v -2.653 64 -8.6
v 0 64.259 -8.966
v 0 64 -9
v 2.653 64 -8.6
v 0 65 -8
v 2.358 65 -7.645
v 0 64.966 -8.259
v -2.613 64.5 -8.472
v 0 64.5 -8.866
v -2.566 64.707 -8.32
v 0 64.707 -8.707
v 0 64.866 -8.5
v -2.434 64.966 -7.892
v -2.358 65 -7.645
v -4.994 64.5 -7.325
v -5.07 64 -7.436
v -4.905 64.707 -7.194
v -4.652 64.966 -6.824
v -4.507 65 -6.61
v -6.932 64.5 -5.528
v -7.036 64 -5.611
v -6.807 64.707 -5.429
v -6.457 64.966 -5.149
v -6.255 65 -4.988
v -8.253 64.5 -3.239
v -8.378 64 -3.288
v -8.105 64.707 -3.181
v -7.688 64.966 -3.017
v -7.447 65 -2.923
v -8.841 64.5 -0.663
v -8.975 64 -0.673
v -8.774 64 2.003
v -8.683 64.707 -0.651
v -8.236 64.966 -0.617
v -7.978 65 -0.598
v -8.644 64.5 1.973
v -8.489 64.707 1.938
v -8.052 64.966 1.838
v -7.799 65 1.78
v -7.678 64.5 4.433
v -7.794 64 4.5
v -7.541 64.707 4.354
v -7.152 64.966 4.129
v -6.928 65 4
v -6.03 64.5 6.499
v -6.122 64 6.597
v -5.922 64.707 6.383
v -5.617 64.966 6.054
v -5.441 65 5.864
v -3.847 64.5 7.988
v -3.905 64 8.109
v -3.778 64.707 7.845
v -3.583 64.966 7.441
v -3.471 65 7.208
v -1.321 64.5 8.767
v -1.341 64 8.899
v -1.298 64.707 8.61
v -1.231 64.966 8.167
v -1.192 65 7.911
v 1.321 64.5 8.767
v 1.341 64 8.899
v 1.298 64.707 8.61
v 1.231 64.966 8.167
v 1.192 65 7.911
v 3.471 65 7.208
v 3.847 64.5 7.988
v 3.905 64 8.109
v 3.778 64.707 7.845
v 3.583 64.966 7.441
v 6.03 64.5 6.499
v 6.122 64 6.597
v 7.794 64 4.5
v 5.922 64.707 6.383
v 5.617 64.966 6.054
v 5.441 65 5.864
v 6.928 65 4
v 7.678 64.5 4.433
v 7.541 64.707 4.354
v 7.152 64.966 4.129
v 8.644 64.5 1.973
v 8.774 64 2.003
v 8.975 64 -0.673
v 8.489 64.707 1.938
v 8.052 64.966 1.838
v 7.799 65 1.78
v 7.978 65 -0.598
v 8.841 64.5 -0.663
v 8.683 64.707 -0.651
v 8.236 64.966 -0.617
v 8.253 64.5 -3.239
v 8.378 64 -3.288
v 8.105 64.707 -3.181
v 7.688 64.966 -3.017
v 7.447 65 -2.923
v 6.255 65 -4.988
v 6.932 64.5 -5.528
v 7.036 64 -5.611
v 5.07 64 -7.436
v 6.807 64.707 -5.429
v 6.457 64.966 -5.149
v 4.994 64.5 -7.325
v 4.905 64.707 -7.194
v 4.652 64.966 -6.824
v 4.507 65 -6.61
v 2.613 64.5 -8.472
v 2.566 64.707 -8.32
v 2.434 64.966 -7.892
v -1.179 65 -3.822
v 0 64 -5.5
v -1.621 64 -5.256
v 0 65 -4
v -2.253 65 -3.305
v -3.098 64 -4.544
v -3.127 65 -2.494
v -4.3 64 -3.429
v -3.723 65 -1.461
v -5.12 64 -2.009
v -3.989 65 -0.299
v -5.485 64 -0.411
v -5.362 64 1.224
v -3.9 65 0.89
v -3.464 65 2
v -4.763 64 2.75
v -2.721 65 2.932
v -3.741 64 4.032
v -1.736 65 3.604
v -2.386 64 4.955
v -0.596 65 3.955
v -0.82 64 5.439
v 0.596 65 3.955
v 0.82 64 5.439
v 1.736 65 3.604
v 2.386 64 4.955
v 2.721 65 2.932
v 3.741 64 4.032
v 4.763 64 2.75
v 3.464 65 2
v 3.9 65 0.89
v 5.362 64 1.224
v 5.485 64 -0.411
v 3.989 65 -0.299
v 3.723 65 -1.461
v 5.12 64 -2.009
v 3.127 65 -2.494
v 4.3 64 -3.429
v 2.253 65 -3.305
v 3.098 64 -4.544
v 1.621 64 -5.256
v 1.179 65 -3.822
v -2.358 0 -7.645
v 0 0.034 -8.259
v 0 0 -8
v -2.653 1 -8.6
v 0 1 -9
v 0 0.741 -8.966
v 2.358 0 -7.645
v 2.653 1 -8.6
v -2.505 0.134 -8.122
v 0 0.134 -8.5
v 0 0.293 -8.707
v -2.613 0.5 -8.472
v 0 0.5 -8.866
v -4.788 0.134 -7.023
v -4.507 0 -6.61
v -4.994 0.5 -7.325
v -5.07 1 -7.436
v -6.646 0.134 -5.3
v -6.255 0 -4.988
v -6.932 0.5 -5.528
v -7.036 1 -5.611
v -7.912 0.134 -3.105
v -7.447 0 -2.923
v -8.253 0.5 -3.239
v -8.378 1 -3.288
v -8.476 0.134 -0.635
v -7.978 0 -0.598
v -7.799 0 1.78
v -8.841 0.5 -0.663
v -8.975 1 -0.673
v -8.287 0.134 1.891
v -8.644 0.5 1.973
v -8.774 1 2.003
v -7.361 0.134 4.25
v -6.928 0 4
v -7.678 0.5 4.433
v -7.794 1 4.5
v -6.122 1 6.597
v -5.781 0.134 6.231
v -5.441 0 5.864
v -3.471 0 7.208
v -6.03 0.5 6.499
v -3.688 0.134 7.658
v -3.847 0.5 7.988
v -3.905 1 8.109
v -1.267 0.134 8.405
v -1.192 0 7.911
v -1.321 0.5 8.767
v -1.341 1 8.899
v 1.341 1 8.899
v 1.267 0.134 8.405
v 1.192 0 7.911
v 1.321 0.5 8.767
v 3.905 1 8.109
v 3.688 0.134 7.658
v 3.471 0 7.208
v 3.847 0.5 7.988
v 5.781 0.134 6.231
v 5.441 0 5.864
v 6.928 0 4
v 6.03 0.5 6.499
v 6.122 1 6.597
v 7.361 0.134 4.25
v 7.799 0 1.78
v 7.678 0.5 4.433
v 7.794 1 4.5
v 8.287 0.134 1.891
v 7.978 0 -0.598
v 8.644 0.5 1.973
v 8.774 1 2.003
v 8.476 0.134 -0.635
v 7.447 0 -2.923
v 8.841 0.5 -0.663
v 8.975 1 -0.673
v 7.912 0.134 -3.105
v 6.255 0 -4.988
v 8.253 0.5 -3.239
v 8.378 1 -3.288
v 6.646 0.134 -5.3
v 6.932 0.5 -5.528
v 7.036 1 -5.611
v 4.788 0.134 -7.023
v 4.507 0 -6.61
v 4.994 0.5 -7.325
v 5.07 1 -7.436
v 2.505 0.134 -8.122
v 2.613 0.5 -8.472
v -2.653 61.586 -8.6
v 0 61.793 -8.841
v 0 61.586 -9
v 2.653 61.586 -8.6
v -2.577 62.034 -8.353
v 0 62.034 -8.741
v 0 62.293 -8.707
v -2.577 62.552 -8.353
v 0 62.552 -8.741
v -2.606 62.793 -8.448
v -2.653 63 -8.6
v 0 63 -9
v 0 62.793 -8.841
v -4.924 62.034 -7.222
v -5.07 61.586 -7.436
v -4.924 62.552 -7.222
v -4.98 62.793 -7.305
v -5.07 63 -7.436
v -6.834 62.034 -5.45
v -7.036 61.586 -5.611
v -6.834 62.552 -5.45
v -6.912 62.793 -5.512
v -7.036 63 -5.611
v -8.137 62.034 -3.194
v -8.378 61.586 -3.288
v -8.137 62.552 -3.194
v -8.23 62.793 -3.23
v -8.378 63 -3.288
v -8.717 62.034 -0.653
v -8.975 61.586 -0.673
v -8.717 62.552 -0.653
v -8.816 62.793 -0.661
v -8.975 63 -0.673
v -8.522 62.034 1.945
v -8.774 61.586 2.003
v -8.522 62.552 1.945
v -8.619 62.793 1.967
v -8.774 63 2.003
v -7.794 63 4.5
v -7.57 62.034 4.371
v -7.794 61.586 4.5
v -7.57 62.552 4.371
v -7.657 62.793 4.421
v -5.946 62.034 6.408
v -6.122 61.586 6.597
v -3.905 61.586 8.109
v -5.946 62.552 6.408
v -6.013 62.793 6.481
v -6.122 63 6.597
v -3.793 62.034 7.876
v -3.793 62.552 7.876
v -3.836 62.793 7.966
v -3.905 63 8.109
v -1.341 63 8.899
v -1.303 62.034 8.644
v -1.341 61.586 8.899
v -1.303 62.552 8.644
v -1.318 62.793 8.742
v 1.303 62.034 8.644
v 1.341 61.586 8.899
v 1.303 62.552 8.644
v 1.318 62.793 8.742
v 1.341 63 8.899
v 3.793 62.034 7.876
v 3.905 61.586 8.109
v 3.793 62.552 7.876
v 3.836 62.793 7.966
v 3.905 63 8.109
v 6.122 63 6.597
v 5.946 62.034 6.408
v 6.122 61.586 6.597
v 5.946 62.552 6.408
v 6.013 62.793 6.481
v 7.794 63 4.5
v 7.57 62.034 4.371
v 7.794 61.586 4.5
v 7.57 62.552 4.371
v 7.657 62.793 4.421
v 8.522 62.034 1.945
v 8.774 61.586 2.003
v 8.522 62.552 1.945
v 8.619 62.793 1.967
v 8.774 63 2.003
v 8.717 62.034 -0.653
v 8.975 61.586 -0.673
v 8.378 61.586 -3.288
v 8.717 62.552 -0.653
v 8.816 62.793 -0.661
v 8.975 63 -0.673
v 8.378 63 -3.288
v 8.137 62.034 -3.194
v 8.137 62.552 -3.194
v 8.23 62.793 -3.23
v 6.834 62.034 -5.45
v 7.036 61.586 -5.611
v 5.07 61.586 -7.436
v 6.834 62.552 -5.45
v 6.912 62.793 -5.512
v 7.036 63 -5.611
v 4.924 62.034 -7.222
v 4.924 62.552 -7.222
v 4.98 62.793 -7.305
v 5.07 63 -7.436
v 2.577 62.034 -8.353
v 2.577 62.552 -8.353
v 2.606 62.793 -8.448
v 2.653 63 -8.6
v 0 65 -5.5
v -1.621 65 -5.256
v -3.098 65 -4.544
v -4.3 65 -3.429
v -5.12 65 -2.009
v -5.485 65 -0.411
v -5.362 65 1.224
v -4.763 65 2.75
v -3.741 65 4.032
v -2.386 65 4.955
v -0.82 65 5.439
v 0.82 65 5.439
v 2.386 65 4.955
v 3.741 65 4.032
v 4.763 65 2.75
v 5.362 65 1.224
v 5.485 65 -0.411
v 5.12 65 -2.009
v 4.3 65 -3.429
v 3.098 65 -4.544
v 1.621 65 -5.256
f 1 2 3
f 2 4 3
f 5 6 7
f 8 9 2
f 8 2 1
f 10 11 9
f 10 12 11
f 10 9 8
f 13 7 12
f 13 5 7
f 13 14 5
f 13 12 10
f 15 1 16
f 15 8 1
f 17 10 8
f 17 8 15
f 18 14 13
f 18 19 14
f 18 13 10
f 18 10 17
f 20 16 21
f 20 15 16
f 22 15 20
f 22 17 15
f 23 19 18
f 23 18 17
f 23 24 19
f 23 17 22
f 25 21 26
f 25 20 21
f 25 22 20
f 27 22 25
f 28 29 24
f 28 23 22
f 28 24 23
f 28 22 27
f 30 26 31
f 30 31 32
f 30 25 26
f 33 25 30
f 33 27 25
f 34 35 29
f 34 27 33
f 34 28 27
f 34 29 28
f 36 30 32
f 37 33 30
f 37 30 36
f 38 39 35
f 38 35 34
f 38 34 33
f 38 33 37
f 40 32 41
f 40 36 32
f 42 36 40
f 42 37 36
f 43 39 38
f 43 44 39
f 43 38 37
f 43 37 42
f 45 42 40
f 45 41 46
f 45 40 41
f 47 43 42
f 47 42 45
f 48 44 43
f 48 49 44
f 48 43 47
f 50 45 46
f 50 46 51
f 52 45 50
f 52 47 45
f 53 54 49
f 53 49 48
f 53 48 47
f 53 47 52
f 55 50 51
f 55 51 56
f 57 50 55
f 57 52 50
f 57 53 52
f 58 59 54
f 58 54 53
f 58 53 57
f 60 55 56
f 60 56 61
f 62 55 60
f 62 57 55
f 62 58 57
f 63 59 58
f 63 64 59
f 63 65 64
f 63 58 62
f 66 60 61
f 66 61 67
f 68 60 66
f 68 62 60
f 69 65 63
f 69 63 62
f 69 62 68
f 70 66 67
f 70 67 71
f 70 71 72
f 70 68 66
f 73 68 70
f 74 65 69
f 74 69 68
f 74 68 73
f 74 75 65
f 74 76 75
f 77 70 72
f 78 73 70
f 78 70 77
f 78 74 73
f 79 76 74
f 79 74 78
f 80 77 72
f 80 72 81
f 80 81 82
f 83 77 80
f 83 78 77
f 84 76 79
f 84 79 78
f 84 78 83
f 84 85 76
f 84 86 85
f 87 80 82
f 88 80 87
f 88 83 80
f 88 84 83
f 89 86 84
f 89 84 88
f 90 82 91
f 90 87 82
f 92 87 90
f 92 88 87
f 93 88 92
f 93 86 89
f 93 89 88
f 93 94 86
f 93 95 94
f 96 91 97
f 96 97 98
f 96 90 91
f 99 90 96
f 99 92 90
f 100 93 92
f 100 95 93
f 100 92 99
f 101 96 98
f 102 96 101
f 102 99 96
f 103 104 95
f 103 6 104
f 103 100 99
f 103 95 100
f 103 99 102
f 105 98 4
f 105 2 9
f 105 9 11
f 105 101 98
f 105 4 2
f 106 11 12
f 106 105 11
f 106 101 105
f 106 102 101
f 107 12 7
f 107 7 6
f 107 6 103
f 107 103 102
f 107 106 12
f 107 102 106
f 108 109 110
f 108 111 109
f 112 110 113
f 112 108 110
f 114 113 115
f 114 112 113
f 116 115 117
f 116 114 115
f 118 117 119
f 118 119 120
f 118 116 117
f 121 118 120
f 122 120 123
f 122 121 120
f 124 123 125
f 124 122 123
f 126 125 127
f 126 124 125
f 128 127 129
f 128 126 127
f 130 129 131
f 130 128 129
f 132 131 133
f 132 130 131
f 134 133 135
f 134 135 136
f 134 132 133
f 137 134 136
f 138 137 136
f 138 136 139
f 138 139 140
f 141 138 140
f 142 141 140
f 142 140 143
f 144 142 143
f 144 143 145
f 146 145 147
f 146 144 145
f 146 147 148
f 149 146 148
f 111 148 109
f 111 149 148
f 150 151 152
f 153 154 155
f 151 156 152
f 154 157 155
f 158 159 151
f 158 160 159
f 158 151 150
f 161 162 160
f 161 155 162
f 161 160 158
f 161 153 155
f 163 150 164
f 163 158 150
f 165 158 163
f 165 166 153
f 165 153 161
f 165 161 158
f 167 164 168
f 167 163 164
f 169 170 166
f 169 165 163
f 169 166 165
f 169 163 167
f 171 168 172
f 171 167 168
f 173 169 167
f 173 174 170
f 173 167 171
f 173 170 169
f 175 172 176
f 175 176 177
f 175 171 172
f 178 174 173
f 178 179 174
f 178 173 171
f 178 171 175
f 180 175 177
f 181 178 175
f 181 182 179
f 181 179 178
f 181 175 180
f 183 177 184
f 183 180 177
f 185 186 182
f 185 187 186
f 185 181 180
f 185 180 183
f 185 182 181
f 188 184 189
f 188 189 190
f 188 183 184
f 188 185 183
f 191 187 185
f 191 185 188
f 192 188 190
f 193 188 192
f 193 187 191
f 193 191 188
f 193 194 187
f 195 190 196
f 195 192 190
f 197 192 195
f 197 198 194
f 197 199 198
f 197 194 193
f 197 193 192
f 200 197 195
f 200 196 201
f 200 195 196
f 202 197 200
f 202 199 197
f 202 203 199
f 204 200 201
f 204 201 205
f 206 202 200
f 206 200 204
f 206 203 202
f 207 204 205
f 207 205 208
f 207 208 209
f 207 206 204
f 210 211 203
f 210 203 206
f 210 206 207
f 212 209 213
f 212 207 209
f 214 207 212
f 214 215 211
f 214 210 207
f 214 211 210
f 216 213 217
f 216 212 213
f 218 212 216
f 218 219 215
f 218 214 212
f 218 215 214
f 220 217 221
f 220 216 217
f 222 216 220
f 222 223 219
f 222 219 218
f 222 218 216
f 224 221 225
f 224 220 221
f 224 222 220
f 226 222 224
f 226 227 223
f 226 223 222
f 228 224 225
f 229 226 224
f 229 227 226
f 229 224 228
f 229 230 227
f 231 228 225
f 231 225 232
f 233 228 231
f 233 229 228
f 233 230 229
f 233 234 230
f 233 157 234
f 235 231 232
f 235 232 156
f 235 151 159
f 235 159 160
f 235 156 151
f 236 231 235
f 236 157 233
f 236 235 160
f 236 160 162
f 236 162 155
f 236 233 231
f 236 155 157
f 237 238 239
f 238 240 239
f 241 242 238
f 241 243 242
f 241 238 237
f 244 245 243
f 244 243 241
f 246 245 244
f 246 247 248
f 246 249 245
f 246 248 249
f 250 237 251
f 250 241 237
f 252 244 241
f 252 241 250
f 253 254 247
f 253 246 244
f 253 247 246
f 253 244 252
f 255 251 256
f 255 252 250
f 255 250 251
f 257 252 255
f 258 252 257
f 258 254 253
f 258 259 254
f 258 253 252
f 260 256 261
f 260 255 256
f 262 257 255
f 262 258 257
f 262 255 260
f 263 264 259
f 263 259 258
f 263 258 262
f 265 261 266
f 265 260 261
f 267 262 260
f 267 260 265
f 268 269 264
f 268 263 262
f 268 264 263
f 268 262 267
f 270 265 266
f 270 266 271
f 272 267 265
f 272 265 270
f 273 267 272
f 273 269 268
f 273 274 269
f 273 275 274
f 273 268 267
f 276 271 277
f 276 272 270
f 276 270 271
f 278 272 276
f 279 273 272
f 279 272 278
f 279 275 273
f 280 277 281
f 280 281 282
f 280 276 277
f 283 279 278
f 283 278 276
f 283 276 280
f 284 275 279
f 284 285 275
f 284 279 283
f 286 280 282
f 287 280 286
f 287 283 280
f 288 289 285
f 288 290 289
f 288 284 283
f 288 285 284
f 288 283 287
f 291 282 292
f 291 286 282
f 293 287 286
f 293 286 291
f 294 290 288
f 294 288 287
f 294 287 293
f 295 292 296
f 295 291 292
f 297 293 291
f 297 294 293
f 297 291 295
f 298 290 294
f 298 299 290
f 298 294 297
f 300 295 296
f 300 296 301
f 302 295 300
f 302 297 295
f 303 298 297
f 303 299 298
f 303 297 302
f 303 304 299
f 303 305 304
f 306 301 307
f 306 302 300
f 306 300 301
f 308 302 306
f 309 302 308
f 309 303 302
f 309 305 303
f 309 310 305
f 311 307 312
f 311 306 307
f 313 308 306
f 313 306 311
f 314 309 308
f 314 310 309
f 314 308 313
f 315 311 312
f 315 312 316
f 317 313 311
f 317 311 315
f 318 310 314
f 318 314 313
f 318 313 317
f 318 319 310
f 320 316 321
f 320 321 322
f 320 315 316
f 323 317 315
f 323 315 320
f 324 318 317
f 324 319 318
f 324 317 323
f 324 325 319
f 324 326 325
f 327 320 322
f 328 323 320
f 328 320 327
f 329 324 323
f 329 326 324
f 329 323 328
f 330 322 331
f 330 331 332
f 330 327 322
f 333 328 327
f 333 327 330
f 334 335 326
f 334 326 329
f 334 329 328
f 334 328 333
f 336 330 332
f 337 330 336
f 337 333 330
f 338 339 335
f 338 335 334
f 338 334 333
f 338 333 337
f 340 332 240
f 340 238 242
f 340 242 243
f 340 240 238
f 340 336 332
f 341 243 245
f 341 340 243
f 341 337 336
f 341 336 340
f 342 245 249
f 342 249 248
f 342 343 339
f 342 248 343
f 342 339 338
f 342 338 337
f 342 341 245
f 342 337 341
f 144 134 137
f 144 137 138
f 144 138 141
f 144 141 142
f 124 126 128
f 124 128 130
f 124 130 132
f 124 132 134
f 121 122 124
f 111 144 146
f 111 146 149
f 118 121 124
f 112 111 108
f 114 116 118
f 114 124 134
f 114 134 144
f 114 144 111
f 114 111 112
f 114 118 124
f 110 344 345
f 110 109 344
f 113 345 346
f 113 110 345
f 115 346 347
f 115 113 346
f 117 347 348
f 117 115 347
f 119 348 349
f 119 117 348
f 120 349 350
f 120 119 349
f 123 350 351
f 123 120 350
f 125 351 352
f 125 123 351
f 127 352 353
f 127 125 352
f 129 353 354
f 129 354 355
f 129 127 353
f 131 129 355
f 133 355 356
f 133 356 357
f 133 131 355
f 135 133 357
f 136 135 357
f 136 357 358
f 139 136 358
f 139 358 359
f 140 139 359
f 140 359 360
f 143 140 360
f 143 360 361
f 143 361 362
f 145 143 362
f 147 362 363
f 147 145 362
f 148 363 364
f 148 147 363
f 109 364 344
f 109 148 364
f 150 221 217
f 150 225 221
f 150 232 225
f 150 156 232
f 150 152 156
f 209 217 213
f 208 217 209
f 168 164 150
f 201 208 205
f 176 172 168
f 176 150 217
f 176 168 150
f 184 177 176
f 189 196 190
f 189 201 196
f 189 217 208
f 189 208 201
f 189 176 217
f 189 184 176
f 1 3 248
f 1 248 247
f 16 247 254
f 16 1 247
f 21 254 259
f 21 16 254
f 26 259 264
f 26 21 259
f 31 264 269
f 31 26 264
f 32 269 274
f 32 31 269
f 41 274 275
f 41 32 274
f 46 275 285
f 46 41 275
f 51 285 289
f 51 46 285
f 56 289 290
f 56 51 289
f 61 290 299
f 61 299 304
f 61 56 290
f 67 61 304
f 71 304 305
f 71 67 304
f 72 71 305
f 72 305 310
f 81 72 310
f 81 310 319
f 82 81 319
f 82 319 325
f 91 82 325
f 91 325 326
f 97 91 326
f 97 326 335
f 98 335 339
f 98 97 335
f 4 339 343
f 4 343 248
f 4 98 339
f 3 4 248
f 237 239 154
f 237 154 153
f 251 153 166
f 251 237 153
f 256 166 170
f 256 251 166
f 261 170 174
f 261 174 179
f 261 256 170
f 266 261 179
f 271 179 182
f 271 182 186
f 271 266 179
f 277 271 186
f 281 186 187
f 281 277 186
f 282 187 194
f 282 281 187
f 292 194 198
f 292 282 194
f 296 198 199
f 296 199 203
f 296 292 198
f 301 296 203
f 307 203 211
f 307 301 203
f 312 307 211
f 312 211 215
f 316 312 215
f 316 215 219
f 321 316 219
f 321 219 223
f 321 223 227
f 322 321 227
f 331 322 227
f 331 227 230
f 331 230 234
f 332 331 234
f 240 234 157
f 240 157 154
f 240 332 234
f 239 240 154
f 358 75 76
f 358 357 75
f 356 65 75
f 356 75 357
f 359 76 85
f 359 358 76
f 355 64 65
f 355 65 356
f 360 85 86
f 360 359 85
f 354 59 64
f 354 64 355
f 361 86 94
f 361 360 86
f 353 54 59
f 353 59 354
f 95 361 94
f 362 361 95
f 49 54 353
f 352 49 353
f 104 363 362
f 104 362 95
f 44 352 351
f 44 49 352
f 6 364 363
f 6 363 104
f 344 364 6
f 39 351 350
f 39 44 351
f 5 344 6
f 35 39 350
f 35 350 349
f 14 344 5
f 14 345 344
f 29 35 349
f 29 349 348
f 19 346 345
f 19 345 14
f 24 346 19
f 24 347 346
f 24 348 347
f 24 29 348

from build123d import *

# Parameters (mm, degrees)
FILLET2_R = 1


with BuildPart() as part:
    # Sketch2 → Revolve1 (revolve)
    with BuildSketch(Plane.XY, mode=Mode.PRIVATE) as revolve1_sk:
        with BuildLine():
            Line((0, 0), (9, 0))
            Line((9, 0), (9, 61.585786438))
            ThreePointArc((9, 61.585786438), (8.707106781, 62.292893219), (9, 63))
            Line((9, 63), (9, 65))
            Line((9, 65), (5.5, 65))
            Line((5.5, 65), (5.5, 64))
            Line((5.5, 64), (4, 65))
            Line((4, 65), (0, 65))
            Line((0, 65), (0, 0))
        make_face()
    revolve(revolve1_sk.sketch.rotate(Axis((0, 0, 0), (0, 1, 0)), 90), axis=Axis((0, 0, 0), (0, 1, 0)))

    # Fillet2
    fillet2_edges = [part.edges().sort_by_distance(p)[0] for p in [
        (0, 0, 9),
        (0, 65, 9),
    ]]
    fillet(fillet2_edges, radius=FILLET2_R)


solid = part.part
